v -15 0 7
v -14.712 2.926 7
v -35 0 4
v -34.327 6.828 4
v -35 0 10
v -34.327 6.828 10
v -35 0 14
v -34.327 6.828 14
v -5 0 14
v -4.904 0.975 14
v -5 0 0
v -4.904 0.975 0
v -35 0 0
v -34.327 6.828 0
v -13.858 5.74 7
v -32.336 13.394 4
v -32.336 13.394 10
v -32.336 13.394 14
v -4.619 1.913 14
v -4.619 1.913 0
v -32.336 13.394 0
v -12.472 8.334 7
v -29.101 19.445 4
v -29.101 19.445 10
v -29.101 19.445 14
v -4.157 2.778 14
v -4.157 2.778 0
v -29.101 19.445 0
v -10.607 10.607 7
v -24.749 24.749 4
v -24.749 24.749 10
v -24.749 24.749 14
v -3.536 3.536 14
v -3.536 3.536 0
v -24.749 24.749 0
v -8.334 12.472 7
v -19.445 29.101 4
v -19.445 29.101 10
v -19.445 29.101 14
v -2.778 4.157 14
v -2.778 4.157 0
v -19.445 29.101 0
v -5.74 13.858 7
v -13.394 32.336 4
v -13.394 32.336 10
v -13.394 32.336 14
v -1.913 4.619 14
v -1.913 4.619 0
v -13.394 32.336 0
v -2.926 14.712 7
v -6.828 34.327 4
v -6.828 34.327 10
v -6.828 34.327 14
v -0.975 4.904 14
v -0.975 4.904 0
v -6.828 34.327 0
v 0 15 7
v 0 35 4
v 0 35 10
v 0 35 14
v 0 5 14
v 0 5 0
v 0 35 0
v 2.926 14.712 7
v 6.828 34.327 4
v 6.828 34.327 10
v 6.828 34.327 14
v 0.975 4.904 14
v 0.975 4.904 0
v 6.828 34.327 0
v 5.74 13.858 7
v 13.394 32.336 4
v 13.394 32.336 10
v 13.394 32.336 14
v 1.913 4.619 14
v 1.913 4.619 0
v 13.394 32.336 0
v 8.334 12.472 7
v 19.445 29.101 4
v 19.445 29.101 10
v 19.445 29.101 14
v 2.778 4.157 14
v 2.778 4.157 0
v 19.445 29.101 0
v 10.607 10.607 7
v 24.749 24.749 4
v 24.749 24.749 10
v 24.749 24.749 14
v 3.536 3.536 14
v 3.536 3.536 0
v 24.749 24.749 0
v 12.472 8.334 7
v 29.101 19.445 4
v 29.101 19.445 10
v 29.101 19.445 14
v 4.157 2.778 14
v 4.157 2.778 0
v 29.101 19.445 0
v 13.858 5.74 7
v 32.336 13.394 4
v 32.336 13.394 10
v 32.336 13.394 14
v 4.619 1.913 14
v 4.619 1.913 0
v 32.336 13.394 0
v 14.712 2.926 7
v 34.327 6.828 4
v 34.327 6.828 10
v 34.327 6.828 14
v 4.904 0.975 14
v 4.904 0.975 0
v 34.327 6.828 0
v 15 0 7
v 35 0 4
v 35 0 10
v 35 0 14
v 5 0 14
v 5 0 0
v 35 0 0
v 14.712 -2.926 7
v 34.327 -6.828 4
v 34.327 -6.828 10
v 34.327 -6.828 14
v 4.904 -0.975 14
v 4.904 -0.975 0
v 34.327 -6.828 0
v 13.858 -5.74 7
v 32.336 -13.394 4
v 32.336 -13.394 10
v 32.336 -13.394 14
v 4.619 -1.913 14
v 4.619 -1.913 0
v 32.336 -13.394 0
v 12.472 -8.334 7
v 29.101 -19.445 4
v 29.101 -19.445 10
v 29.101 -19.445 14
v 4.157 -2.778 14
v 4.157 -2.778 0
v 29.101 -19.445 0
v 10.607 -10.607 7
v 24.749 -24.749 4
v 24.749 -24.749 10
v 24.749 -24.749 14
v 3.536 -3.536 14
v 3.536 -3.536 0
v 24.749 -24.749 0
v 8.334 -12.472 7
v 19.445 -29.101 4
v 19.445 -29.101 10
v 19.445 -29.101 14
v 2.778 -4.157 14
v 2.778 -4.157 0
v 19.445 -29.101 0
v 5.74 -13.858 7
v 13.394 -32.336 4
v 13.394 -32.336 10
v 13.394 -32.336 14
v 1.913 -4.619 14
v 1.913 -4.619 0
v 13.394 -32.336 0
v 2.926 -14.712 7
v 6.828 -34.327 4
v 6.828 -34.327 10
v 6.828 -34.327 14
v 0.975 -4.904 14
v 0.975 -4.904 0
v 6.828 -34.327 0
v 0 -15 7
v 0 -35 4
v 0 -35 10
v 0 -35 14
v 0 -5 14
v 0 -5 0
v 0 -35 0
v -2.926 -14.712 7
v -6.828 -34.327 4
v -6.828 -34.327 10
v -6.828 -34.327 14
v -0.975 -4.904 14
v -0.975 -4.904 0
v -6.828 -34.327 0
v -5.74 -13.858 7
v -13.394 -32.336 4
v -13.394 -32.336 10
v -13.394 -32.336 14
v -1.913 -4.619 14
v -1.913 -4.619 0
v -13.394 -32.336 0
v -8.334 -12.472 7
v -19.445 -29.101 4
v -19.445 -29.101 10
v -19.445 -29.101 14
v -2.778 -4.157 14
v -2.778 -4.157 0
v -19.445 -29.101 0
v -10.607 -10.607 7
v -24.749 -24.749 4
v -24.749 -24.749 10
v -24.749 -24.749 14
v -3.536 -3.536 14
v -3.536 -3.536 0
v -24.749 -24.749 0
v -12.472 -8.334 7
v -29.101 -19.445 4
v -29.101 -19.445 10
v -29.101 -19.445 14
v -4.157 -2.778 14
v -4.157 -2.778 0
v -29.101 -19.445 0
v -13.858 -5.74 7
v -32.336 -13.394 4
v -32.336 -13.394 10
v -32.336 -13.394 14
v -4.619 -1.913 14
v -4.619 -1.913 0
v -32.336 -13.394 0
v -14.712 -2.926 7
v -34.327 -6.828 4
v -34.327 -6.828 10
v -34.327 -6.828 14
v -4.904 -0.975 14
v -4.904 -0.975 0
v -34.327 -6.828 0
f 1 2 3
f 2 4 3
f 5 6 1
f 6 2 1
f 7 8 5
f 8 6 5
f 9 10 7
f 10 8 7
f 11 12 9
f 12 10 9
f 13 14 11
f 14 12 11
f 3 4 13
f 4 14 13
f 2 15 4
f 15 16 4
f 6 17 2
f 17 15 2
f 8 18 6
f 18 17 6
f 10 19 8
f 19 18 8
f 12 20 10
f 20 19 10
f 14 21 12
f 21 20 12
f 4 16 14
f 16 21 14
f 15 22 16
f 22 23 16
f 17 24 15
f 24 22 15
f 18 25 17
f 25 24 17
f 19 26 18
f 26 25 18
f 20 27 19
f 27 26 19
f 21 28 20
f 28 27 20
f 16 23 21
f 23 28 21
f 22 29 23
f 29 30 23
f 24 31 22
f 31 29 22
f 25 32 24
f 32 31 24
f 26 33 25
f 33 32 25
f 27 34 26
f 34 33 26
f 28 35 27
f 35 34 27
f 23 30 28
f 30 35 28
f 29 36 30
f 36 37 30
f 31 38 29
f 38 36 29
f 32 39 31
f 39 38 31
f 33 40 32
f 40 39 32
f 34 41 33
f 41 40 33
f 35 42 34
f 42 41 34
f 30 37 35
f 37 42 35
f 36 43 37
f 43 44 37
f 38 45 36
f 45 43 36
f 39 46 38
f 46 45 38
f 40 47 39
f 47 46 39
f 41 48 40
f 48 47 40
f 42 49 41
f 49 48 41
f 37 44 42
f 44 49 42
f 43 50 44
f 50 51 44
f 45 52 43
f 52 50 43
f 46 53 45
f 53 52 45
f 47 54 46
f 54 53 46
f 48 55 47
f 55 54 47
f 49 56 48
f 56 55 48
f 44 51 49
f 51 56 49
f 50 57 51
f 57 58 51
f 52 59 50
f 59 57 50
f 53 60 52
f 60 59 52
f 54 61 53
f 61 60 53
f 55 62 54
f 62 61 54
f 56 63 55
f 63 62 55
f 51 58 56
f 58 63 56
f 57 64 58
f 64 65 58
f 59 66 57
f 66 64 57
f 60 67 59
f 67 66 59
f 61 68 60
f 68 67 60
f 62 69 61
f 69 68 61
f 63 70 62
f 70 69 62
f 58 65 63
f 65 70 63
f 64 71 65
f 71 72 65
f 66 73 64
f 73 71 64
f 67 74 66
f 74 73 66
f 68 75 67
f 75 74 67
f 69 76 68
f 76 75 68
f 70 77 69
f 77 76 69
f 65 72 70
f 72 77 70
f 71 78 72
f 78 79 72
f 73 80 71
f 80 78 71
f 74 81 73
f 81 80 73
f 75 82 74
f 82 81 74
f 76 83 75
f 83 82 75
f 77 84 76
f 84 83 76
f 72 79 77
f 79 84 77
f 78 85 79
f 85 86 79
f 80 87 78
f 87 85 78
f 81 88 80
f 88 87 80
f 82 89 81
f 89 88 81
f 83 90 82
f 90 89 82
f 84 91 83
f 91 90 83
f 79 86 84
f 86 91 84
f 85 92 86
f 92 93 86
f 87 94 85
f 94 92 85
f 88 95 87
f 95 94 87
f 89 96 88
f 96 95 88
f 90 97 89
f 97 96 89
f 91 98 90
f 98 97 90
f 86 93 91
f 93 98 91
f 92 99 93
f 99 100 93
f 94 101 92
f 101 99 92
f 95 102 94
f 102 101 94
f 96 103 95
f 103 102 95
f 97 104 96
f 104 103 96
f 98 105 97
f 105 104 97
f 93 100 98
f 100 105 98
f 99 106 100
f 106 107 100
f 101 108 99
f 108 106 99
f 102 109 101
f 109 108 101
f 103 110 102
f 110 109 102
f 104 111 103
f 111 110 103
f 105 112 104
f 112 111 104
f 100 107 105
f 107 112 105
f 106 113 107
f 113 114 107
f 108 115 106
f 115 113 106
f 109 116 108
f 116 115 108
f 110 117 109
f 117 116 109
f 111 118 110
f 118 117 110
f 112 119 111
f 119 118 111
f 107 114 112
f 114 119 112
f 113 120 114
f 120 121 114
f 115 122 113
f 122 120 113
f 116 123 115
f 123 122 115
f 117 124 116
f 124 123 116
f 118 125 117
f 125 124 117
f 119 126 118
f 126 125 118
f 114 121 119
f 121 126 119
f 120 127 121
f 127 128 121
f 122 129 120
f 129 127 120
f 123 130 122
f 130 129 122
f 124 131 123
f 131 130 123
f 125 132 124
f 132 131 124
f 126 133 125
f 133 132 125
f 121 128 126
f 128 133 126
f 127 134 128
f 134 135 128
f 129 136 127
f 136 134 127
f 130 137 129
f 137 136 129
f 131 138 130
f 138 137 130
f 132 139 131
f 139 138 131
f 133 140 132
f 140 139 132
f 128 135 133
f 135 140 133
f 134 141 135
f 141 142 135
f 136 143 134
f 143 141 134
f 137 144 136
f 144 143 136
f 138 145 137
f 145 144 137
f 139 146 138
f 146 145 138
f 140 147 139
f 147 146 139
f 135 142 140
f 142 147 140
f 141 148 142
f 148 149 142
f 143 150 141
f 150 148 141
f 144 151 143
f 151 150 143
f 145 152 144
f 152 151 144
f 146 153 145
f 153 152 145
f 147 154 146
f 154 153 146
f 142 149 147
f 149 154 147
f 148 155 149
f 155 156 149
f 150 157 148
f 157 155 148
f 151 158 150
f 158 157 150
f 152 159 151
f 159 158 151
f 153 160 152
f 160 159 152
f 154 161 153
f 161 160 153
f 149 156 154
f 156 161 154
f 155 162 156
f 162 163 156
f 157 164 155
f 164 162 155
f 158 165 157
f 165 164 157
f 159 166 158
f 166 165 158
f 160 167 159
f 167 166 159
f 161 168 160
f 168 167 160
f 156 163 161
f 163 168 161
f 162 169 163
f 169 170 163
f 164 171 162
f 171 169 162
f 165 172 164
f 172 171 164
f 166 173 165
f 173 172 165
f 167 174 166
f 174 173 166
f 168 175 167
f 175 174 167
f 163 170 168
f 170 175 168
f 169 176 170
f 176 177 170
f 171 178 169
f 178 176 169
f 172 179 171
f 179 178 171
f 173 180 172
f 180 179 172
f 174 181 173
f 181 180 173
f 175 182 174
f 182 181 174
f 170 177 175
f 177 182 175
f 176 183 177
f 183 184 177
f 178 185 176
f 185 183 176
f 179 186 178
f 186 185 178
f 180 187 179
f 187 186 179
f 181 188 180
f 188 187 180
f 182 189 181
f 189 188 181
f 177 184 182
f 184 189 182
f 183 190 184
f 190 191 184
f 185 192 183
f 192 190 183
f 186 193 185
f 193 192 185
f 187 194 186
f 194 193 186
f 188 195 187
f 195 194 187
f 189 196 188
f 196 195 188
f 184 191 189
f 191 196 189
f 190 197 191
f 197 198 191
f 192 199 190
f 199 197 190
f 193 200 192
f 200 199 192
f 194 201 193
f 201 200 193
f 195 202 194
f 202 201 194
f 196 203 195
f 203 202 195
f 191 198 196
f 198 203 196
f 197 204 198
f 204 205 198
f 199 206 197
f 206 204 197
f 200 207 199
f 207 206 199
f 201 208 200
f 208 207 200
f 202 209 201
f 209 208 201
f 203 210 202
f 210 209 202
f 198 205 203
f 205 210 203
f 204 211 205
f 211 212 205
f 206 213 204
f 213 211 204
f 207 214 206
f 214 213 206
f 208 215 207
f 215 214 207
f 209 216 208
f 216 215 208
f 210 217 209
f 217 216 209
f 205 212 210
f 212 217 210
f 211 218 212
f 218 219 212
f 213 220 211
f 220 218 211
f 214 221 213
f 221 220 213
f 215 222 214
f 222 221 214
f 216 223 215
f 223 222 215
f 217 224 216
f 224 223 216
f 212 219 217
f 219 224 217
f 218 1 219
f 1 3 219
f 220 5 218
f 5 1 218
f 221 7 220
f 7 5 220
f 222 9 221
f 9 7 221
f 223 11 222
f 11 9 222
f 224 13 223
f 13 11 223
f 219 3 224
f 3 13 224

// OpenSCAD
$fn = 32;

// ----------------------------------------------------------------------
// Revolved part: V-groove pulley R35
// ----------------------------------------------------------------------

// --- parameters (mm) ---
bore_r = 5;               // bore radius
rim_r = 35;               // rim radius
rim_t = 14;               // rim width
groove_r = 15;            // groove root radius
groove_w = 3;             // groove half width
revolve_angle = 360;      // revolve sweep, degrees

bore_d = 2 * bore_r;
rim_d = 2 * rim_r;
groove_d = 2 * groove_r;

profile = [[5, 0], [35, 0], [35, 4], [15, 7], [35, 10], [35, 14], [5, 14]];  // primary outline, 7 points, counter clockwise

// --- the one profile operation ---
rotate_extrude(angle = revolve_angle) polygon(points = profile);
